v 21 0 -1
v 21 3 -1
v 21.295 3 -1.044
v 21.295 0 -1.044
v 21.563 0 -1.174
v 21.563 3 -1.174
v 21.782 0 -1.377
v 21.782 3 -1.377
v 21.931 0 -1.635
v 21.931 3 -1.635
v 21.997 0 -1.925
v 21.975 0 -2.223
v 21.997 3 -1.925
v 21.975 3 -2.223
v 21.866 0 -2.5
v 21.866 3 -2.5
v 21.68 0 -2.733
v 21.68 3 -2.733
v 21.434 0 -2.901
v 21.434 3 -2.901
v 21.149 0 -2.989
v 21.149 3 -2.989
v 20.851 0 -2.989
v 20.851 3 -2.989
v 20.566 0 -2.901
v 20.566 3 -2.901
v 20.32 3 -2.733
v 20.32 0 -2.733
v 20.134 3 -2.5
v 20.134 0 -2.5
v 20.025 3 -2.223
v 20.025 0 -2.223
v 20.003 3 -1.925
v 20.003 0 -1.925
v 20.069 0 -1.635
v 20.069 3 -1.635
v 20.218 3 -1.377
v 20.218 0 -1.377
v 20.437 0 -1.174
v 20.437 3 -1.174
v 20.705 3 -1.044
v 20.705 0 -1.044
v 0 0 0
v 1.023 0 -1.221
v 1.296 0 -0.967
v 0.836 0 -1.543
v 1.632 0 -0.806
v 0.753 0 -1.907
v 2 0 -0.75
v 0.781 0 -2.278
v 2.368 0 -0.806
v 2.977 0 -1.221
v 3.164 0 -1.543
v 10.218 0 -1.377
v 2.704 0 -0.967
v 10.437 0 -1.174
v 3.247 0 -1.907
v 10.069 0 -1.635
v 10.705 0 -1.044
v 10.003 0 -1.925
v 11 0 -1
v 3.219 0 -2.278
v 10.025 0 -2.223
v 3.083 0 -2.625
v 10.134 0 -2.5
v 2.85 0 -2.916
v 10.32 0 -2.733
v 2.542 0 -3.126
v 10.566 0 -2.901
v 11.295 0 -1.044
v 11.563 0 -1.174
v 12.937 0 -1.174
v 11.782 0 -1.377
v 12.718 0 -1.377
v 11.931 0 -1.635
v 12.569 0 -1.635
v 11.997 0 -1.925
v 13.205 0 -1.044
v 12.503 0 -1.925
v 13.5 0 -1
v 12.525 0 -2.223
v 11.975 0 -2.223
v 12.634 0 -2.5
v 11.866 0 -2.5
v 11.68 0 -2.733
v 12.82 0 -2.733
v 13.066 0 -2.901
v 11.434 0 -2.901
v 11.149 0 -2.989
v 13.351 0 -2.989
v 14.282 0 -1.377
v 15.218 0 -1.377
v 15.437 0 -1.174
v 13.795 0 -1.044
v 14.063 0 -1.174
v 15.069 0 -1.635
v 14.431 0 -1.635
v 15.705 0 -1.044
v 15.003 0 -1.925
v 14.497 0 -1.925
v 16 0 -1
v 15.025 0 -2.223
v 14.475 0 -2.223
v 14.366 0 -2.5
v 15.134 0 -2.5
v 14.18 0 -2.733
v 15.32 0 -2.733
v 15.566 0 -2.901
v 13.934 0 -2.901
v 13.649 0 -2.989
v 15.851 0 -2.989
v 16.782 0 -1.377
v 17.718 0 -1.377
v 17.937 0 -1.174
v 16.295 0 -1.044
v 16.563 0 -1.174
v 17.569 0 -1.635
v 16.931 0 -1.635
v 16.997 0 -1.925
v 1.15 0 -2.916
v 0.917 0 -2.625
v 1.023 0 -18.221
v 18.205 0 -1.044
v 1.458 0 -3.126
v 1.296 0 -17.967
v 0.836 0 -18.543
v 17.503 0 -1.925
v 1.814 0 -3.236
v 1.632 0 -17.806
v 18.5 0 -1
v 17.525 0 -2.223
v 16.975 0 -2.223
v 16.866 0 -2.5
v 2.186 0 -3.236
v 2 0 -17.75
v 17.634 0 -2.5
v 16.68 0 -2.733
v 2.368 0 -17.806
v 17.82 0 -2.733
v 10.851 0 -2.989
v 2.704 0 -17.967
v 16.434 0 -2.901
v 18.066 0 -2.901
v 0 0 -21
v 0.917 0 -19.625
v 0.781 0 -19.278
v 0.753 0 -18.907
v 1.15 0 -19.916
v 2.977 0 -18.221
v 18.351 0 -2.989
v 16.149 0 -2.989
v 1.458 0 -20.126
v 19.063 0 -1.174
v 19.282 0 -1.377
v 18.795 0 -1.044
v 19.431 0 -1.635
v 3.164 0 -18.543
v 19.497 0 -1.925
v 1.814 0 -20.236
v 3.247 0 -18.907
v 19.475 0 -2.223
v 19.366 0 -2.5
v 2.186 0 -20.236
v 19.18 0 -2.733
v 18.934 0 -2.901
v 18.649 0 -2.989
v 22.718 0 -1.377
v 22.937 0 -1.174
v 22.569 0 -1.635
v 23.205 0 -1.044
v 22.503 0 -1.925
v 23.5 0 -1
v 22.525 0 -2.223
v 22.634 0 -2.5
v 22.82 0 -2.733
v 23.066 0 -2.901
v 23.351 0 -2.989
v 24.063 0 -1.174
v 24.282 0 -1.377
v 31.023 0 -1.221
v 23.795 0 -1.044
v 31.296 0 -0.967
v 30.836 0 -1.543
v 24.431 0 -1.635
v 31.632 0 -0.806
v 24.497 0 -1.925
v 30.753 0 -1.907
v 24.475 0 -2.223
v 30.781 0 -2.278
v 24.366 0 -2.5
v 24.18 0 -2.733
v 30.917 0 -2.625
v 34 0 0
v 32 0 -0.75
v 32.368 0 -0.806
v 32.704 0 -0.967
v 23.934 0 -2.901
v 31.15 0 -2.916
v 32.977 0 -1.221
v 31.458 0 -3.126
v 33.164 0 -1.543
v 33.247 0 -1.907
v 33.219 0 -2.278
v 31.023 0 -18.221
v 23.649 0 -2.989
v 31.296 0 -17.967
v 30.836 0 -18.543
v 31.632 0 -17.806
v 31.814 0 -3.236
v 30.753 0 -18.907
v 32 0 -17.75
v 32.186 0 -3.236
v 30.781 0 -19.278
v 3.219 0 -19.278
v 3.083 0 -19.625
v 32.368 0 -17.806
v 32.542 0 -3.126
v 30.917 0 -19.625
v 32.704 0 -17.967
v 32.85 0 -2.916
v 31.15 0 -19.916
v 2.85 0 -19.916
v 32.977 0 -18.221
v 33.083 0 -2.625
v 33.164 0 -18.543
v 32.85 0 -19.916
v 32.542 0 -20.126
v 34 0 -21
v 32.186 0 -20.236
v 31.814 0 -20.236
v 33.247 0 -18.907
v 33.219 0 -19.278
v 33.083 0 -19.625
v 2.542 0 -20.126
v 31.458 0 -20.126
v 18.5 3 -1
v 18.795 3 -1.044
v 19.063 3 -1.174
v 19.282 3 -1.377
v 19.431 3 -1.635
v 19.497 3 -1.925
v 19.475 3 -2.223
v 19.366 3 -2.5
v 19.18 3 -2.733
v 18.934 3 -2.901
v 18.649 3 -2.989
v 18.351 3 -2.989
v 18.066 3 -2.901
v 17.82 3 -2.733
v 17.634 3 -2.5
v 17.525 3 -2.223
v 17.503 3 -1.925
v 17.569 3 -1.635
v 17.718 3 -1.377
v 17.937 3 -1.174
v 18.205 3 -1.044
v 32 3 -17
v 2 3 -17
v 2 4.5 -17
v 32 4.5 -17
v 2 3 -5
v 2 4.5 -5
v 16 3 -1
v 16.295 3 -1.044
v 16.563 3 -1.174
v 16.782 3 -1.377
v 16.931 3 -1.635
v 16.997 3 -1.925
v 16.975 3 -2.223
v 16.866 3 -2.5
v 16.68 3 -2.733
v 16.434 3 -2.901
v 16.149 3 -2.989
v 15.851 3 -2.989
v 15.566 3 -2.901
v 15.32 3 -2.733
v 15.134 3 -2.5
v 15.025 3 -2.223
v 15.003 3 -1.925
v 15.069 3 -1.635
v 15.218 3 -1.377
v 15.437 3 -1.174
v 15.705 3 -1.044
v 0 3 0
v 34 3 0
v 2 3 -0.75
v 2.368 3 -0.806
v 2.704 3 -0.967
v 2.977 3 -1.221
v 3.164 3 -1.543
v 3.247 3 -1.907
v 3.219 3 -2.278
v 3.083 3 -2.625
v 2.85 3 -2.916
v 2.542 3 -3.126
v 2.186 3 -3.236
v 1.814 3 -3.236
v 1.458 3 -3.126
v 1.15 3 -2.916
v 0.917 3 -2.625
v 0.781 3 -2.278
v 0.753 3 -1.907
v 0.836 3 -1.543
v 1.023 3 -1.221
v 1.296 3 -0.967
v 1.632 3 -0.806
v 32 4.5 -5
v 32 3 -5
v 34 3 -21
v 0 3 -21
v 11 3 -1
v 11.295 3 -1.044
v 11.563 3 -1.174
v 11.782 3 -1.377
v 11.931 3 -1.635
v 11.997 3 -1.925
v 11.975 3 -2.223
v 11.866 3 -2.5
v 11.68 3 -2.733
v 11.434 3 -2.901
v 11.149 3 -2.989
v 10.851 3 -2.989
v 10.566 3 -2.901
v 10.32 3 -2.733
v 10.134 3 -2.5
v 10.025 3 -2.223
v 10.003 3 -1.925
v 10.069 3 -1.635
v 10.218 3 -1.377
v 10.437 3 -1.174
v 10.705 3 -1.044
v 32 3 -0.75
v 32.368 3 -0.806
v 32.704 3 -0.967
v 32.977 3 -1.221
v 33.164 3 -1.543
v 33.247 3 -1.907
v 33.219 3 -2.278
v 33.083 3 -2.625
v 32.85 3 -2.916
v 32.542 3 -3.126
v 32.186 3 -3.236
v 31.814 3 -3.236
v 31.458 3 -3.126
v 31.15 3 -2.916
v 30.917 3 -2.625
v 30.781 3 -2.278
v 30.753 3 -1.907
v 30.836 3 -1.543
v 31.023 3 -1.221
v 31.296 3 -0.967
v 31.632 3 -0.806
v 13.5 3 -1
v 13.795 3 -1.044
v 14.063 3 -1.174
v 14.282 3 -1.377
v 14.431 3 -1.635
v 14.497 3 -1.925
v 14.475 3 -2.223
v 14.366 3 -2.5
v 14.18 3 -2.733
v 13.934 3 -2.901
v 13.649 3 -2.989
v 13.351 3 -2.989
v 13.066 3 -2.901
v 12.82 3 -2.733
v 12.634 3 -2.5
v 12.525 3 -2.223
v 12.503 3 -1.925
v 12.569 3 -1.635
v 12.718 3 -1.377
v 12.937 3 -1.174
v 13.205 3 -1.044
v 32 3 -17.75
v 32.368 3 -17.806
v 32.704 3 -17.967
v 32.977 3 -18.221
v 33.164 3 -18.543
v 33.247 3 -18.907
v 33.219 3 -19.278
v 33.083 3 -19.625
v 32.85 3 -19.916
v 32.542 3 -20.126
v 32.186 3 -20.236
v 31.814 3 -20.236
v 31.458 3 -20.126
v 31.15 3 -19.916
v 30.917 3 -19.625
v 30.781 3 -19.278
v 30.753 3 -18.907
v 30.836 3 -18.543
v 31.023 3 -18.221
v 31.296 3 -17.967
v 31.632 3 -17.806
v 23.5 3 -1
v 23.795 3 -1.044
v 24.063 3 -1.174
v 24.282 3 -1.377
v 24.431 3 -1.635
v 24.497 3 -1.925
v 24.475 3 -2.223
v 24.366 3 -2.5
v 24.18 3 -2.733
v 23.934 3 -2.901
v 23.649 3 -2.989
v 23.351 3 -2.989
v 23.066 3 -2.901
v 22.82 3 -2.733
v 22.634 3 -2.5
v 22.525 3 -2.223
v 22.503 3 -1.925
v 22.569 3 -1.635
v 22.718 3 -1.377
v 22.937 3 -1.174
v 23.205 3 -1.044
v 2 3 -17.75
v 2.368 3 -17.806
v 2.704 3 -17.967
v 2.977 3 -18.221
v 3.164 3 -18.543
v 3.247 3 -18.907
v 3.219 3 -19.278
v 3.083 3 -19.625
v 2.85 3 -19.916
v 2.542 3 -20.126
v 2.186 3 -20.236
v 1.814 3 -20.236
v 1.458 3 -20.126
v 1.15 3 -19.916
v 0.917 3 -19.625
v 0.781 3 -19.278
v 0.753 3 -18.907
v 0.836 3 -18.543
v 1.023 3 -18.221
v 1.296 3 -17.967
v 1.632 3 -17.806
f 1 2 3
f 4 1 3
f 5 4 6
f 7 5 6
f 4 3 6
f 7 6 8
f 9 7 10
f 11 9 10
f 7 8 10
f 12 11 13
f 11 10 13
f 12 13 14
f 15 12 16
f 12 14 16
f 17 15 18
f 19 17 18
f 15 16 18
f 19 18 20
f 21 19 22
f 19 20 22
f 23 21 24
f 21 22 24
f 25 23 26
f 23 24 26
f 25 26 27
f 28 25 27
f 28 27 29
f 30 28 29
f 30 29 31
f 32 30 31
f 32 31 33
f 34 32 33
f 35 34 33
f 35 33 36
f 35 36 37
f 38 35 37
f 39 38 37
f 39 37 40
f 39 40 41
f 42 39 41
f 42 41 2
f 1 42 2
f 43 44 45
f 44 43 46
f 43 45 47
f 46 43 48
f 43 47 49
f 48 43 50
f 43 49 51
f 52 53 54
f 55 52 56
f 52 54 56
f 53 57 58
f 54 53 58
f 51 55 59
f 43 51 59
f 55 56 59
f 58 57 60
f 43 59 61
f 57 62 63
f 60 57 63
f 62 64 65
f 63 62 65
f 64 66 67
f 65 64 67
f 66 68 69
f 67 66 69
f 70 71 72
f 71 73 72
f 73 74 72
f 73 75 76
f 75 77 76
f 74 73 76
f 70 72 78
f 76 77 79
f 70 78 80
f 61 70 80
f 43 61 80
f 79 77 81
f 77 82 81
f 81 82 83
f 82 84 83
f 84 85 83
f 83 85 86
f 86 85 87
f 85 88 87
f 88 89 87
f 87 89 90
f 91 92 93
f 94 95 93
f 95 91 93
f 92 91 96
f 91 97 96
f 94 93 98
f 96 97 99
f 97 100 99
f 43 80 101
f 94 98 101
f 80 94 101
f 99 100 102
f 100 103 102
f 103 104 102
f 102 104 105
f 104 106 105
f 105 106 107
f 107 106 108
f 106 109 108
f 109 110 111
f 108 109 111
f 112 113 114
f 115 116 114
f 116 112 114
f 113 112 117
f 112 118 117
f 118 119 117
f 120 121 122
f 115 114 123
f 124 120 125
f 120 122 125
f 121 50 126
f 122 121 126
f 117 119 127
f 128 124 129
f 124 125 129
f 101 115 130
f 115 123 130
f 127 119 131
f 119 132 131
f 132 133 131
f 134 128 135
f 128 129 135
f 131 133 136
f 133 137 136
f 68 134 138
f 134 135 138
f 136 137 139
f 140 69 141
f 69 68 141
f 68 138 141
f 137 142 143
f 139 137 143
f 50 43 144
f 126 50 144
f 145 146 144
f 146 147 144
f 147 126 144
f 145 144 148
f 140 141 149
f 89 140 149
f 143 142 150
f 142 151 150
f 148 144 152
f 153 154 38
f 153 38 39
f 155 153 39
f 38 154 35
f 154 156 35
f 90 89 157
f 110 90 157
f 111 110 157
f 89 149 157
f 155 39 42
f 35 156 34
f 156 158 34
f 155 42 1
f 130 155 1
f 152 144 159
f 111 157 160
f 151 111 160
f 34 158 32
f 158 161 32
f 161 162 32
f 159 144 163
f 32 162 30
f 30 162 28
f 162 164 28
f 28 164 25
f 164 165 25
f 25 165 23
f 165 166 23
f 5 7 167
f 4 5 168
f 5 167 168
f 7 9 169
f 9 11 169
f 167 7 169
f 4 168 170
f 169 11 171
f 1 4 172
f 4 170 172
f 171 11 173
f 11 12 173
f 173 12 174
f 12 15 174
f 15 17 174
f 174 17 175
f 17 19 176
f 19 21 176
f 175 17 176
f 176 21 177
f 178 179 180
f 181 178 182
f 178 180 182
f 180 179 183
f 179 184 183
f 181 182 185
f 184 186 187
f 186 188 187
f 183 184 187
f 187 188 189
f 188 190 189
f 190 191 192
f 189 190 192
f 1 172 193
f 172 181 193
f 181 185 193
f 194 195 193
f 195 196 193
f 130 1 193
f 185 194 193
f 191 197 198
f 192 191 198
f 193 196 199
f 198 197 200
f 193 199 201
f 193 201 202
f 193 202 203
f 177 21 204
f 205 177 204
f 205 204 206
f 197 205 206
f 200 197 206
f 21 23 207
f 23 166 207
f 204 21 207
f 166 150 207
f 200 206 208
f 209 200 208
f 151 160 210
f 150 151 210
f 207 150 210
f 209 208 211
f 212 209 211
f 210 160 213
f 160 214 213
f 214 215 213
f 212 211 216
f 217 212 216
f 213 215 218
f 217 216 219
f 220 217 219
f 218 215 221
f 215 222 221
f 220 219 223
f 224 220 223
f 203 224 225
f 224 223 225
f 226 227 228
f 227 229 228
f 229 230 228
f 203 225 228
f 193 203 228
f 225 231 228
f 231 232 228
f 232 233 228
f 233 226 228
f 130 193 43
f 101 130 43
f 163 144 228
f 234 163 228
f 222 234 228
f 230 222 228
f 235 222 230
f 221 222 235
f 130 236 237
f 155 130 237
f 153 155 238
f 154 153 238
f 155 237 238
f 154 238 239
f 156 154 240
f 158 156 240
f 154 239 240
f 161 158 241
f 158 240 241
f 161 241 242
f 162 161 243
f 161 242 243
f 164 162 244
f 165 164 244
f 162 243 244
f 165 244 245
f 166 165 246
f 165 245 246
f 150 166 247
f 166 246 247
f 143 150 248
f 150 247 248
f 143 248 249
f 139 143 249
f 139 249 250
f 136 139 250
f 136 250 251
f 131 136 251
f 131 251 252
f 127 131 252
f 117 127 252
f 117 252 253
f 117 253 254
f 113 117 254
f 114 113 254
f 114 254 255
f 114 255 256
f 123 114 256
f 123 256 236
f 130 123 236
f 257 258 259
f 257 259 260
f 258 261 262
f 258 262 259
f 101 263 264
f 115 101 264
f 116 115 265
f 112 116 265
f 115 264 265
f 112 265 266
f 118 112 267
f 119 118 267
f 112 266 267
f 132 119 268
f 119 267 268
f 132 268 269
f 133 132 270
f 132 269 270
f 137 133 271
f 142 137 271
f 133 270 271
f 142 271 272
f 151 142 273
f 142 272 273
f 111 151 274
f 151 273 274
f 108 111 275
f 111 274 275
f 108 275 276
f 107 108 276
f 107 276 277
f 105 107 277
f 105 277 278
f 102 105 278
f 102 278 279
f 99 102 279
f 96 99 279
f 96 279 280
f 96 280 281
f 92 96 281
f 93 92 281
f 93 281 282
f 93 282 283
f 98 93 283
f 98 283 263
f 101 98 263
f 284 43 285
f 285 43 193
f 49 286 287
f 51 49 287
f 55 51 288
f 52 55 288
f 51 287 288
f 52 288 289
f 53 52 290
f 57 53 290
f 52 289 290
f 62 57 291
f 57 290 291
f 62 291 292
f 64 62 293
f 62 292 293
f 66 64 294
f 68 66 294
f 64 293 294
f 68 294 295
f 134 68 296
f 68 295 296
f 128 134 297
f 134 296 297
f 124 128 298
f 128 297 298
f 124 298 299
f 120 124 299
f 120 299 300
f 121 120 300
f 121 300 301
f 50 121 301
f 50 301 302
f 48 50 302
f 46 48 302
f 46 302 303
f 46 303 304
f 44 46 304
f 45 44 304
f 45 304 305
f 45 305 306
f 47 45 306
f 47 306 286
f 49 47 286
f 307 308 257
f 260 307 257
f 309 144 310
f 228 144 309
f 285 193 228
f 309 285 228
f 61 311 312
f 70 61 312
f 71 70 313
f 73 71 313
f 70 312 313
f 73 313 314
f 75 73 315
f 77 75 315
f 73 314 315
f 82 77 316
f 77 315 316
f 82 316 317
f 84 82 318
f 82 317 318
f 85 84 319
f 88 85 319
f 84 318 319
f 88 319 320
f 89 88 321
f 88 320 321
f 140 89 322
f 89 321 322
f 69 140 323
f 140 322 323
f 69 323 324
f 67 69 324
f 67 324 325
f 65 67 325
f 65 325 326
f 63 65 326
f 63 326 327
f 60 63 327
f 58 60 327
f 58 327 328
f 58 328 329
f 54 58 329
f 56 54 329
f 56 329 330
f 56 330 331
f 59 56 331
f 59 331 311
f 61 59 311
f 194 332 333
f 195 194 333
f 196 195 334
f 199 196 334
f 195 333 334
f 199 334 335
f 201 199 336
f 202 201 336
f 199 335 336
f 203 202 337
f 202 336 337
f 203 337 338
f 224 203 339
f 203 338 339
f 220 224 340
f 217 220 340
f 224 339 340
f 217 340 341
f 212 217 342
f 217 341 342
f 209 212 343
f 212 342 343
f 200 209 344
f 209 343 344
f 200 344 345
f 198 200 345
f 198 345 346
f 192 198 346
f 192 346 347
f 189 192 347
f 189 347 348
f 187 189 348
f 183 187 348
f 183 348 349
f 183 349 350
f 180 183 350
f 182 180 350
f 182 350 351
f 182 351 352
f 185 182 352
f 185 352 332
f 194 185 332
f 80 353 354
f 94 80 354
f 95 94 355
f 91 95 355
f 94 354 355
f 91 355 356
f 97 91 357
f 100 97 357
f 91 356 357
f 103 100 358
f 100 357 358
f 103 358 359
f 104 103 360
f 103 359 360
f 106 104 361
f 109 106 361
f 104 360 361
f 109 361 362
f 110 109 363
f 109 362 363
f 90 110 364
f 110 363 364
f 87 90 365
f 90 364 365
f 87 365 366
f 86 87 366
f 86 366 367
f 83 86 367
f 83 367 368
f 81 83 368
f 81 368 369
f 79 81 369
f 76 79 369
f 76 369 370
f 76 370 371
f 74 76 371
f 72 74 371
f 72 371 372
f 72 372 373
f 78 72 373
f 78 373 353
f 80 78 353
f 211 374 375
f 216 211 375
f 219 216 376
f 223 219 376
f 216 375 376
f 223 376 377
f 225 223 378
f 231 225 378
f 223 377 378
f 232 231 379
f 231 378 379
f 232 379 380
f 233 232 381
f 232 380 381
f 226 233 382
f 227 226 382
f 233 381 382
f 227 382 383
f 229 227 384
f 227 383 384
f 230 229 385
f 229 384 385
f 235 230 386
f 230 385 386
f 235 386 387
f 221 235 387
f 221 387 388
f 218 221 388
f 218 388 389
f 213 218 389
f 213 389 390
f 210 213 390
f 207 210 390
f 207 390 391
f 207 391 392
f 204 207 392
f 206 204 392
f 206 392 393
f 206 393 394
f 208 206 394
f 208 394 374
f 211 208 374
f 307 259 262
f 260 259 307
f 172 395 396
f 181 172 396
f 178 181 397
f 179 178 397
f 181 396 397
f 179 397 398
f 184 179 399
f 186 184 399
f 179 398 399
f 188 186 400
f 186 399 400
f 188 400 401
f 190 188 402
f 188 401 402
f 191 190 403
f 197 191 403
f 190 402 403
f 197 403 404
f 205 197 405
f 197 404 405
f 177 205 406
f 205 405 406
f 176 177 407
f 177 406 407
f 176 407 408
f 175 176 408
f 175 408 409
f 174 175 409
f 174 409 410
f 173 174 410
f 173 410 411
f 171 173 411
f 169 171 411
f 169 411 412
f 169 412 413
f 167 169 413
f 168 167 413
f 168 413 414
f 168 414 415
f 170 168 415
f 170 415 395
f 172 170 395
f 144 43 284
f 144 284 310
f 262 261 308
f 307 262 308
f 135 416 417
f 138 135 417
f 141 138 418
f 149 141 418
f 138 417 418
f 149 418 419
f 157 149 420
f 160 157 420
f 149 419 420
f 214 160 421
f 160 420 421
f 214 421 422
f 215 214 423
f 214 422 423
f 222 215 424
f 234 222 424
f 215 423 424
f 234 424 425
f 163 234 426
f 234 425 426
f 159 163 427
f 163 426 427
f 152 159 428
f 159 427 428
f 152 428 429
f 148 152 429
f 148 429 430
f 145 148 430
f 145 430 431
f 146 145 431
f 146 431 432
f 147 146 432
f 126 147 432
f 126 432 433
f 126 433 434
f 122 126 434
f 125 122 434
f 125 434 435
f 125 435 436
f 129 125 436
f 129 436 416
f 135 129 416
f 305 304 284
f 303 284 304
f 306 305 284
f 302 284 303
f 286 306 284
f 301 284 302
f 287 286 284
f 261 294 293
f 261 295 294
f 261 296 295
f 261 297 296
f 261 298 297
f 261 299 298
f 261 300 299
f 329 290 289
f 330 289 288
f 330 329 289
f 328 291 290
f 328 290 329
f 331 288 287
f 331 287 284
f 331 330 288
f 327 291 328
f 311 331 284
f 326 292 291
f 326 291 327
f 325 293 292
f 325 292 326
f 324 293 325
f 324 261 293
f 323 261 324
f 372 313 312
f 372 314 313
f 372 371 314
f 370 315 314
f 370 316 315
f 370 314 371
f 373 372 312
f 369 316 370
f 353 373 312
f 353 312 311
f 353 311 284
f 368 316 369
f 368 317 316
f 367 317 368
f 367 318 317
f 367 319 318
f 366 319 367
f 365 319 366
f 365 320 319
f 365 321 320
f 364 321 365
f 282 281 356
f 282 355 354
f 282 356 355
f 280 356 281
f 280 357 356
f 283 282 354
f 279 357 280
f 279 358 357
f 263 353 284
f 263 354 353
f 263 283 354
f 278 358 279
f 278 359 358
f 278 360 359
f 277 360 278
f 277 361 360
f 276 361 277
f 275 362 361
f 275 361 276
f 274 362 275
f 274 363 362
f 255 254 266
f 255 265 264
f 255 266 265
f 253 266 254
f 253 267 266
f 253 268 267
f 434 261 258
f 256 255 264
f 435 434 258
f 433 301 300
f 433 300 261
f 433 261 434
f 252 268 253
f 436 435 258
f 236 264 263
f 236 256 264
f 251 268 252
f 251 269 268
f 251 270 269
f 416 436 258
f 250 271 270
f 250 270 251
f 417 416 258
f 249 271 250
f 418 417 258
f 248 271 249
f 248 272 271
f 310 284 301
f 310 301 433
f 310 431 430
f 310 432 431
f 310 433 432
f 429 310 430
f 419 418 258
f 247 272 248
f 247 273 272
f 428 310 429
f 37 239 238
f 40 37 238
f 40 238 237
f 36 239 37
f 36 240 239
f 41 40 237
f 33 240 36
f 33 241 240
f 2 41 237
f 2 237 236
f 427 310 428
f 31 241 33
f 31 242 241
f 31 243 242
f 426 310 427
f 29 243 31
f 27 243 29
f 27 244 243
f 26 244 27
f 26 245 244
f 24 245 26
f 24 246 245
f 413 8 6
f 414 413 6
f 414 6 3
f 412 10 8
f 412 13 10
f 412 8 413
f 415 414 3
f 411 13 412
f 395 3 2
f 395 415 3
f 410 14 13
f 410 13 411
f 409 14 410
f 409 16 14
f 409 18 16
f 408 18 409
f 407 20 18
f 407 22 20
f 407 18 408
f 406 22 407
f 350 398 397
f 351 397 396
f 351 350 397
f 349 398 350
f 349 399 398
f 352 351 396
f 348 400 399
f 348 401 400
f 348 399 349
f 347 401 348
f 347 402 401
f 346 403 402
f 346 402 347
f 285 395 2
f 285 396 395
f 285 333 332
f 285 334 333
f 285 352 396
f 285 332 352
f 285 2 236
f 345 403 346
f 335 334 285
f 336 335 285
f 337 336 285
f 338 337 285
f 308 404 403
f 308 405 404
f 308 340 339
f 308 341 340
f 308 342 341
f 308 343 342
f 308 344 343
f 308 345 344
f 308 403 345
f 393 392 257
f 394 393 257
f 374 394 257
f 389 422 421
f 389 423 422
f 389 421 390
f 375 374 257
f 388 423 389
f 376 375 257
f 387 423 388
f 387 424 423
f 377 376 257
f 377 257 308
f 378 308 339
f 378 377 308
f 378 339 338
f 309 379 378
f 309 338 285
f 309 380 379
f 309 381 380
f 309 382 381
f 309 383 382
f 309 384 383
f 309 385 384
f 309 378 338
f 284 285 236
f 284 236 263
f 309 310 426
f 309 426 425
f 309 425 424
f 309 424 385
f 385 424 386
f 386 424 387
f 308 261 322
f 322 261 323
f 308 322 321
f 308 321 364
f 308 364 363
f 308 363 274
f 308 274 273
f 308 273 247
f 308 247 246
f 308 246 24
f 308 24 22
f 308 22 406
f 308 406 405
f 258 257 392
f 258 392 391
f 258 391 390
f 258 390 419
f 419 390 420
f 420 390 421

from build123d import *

# Parameters (mm, degrees)
ESQUISSE1_W             = 34
ESQUISSE1_H             = 21
BOSS_EXTRU_1_DEPTH      = 3
ESQUISSE2_W             = 30
ESQUISSE2_H             = 12
BOSS_EXTRU_2_DEPTH      = 1.5
ESQUISSE3_R             = 1
ESQUISSE3_R_2           = 1.25
ENL_V_MAT_EXTRU_1_DEPTH = 5


with BuildPart() as part:
    # Esquisse1 → Boss.-Extru.1 (new body)
    with BuildSketch(Plane(origin=(0, 0, 0), x_dir=(1, 0, 0), z_dir=(0, 1, 0))):
        with Locations((17, 10.5)):
            Rectangle(ESQUISSE1_W, ESQUISSE1_H)
    extrude(amount=BOSS_EXTRU_1_DEPTH)

    # Esquisse2 → Boss.-Extru.2 (add)
    with BuildSketch(Plane(origin=(0, 3, 0), x_dir=(1, 0, 0), z_dir=(0, 1, 0))):
        with Locations((17, 11)):
            Rectangle(ESQUISSE2_W, ESQUISSE2_H)
    extrude(amount=BOSS_EXTRU_2_DEPTH)

    # Esquisse3 → Enlèv. mat.-Extru.1 (cut)
    with BuildSketch(Plane(origin=(0, 3, 0), x_dir=(1, 0, 0), z_dir=(0, 1, 0))):
        with Locations(Location((11, 2, 0), (0, 0, 270))):
            Circle(ESQUISSE3_R)
        with Locations(Location((13.5, 2, 0), (0, 0, 270))):
            Circle(ESQUISSE3_R)
        with Locations(Location((16, 2, 0), (0, 0, 270))):
            Circle(ESQUISSE3_R)
        with Locations(Location((18.5, 2, 0), (0, 0, 270))):
            Circle(ESQUISSE3_R)
        with Locations(Location((21, 2, 0), (0, 0, 270))):
            Circle(ESQUISSE3_R)
        with Locations(Location((23.5, 2, 0), (0, 0, 270))):
            Circle(ESQUISSE3_R)
        with Locations(Location((2, 2, 0), (0, 0, 270))):
            Circle(ESQUISSE3_R_2)
        with Locations(Location((2, 19, 0), (0, 0, 270))):
            Circle(ESQUISSE3_R_2)
        with Locations(Location((32, 19, 0), (0, 0, 270))):
            Circle(ESQUISSE3_R_2)
        with Locations(Location((32, 2, 0), (0, 0, 270))):
            Circle(ESQUISSE3_R_2)
    extrude(amount=-ENL_V_MAT_EXTRU_1_DEPTH, mode=Mode.SUBTRACT)


solid = part.part
